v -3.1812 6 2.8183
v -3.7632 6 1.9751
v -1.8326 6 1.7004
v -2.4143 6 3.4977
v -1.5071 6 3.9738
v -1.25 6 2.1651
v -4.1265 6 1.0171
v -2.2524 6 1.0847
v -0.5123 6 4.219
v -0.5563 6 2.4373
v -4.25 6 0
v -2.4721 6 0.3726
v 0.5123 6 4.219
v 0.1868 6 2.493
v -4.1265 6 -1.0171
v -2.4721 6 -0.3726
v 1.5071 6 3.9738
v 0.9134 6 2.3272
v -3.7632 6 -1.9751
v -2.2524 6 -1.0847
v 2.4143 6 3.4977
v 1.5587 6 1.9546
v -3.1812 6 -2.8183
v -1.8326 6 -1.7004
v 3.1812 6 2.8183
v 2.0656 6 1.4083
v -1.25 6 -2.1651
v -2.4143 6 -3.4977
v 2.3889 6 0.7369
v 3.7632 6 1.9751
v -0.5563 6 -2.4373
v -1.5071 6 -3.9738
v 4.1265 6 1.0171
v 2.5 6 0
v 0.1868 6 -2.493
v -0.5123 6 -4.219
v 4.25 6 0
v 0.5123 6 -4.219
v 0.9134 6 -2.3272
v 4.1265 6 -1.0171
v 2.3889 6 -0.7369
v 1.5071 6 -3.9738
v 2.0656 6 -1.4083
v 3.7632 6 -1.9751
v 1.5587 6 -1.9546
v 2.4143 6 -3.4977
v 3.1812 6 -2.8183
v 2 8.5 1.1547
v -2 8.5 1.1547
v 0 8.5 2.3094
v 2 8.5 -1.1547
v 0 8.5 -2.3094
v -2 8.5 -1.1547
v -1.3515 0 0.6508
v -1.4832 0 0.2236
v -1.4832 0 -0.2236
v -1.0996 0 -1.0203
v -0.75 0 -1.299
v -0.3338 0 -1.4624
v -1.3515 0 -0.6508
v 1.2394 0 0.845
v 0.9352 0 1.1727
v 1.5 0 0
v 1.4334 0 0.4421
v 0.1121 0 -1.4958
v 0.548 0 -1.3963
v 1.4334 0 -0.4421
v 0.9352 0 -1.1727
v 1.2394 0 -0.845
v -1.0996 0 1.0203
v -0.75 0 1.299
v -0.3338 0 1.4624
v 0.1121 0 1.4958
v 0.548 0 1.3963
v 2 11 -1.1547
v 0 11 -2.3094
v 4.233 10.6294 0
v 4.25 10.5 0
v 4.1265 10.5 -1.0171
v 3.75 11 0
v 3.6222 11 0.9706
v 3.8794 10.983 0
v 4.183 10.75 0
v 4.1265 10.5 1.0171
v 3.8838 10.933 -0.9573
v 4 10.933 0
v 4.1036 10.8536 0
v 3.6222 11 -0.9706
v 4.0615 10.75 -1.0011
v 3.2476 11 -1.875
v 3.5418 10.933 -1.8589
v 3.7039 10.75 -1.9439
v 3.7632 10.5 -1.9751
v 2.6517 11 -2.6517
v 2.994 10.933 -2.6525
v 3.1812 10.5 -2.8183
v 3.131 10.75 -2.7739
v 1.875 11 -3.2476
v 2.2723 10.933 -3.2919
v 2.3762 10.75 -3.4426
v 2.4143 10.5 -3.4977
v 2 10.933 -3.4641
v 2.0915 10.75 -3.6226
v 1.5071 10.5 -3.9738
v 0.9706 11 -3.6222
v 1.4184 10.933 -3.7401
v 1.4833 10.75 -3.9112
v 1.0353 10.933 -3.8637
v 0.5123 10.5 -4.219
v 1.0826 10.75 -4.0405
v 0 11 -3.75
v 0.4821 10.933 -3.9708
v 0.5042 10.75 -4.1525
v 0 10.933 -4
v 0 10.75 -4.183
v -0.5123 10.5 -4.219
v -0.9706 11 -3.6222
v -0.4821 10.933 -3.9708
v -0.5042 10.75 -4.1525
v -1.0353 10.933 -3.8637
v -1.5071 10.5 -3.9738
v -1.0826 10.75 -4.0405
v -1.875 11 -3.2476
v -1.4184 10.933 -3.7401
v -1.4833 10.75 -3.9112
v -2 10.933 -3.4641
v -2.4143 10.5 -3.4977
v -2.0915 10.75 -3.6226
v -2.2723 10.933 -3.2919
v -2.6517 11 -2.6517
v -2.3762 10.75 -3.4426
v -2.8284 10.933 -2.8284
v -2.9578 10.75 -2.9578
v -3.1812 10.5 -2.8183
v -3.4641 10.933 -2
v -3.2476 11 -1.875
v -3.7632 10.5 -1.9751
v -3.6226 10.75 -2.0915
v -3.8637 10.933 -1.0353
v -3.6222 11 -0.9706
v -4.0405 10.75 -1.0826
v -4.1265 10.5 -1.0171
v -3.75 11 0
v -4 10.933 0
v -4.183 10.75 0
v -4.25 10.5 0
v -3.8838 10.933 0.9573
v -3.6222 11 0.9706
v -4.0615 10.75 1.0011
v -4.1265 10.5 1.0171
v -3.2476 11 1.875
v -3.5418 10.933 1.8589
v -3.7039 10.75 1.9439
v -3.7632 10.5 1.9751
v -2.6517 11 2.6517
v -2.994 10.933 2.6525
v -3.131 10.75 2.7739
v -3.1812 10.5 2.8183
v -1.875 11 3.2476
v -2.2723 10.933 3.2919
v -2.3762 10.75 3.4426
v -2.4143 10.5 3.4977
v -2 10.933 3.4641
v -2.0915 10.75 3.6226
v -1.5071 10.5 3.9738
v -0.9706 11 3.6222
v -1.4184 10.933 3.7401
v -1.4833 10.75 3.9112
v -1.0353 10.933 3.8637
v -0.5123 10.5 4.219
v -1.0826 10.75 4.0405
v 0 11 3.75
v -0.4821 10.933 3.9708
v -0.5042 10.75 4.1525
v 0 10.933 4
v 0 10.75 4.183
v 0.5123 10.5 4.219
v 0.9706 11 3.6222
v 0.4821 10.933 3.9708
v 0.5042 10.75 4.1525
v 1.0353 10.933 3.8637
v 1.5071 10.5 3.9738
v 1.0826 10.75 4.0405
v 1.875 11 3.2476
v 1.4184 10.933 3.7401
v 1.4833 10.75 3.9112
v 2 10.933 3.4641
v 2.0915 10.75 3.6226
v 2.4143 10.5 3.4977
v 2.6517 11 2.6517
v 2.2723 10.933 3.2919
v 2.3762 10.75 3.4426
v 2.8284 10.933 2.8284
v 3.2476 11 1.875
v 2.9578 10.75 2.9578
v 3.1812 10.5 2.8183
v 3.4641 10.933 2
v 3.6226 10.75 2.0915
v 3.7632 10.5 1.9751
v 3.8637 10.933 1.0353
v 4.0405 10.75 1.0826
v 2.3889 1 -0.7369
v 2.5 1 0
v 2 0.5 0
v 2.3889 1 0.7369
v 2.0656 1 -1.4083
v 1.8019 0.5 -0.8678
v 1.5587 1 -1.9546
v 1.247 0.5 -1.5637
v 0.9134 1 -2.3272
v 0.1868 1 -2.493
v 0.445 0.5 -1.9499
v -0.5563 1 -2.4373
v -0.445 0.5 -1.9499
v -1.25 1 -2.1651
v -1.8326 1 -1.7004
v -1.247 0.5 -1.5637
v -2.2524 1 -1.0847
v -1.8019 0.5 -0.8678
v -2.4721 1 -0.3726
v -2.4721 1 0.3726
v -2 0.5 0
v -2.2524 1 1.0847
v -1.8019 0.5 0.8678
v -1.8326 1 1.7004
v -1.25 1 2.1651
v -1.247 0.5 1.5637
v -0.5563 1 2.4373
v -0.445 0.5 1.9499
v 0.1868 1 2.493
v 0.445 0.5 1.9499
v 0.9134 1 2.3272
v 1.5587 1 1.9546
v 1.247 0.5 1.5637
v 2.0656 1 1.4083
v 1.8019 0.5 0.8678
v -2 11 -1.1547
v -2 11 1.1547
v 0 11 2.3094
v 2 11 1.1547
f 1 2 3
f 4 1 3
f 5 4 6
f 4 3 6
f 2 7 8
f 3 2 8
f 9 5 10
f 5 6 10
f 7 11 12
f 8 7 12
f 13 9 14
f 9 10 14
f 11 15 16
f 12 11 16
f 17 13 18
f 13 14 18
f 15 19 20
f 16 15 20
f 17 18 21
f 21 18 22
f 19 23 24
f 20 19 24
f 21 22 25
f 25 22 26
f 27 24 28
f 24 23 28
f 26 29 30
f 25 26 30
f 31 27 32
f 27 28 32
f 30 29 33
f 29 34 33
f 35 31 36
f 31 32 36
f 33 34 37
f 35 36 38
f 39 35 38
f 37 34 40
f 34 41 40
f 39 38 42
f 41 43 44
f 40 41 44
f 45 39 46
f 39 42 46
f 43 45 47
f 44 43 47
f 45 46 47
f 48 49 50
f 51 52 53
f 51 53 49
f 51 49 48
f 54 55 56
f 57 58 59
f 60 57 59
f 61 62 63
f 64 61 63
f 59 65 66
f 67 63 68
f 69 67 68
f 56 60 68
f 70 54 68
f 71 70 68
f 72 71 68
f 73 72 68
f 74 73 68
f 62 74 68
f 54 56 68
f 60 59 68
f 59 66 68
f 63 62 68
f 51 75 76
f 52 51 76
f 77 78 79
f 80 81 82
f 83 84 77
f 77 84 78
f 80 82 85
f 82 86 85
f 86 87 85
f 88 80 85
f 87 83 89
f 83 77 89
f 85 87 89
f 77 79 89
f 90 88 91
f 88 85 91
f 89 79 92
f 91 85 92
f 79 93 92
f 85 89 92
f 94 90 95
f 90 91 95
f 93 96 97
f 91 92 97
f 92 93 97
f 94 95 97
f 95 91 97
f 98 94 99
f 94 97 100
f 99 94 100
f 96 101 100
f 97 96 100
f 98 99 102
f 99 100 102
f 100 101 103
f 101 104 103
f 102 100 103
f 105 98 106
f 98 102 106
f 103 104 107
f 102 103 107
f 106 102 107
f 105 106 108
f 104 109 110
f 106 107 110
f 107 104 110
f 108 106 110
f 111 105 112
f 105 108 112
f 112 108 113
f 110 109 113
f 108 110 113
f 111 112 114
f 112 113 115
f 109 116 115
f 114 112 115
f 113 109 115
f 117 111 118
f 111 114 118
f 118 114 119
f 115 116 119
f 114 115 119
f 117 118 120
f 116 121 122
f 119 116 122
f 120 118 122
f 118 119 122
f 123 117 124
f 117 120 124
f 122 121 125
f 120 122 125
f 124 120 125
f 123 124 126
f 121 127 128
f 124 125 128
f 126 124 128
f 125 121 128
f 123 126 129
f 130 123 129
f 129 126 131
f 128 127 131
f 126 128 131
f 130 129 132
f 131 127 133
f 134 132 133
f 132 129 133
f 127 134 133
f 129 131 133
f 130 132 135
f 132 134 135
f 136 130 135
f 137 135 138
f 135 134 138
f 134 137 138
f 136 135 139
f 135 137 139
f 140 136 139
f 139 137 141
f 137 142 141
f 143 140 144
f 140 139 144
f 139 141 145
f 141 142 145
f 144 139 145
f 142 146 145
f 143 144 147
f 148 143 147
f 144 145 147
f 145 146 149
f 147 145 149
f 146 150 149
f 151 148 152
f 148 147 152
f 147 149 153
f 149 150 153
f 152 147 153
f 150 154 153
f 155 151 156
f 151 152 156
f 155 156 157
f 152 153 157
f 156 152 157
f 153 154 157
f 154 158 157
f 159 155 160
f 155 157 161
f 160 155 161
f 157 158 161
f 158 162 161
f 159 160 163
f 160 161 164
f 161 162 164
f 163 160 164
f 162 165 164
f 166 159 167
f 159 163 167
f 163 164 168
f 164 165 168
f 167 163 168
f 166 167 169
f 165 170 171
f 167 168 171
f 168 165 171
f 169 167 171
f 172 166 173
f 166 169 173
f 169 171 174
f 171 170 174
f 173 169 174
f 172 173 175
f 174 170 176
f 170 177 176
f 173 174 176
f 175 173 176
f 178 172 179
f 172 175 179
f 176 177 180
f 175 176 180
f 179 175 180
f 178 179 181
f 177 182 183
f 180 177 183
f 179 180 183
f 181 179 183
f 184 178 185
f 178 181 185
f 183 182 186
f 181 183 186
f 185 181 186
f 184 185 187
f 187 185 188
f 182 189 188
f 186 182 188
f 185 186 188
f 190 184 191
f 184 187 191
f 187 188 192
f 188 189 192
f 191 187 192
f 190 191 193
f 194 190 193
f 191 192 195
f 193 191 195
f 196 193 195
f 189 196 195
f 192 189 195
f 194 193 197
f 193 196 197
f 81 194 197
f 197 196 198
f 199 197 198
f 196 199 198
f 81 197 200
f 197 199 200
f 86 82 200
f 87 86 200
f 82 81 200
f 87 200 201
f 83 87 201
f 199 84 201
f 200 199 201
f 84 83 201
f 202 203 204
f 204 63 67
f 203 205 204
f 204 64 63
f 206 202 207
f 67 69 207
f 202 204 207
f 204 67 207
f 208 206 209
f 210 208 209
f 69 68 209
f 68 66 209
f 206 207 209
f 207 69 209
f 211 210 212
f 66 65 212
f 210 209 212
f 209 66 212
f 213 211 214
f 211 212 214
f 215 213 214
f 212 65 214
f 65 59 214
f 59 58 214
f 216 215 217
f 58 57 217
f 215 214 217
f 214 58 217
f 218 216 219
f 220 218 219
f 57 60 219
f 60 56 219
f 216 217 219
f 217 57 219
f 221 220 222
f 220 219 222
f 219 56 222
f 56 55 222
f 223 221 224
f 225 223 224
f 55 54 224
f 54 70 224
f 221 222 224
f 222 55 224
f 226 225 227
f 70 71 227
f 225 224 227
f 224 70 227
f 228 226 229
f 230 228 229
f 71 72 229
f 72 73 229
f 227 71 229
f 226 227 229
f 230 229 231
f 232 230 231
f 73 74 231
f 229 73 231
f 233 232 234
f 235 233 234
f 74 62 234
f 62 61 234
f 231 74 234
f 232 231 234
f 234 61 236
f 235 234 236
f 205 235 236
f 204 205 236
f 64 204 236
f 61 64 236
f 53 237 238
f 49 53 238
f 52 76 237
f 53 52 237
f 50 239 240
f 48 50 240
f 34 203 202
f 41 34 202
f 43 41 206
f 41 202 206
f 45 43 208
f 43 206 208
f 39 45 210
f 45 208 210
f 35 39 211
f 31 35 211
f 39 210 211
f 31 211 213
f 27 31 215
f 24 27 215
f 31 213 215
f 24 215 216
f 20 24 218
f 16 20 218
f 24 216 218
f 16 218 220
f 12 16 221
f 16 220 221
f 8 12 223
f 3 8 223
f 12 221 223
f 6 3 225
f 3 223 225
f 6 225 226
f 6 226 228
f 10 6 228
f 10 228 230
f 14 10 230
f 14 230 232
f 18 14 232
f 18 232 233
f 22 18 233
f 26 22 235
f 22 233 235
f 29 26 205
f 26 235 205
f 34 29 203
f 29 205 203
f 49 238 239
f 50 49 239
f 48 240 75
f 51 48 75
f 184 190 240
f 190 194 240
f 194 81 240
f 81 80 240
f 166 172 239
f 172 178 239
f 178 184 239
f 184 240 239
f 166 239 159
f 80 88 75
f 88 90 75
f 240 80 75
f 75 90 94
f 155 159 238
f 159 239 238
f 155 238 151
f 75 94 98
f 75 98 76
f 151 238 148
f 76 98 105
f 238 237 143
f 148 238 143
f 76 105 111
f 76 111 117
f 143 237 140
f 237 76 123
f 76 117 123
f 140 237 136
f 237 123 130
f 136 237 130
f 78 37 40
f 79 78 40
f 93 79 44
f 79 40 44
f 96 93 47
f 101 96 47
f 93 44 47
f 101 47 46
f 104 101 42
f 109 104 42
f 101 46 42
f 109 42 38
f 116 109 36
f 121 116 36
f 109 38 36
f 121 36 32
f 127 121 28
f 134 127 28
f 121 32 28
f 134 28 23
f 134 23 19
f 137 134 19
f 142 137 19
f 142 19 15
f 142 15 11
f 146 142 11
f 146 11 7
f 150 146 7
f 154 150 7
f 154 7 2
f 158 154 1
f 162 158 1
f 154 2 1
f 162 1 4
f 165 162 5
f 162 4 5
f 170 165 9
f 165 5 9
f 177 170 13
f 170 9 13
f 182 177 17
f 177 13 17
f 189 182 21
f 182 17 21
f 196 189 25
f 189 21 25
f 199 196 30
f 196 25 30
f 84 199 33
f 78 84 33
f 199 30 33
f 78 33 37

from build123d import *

# Parameters (mm, degrees)
CUT_EXTRUDE1_DEPTH = 2.5
FILLET1_R          = 0.5
CHAMFER1_SIZE      = 1


with BuildPart() as part:
    # Sketch1 → Revolve1 (revolve)
    with BuildSketch(Plane.XY, mode=Mode.PRIVATE) as revolve1_sk:
        Polygon((0, 0), (0, 11), (-4.25, 11), (-4.25, 6), (-2.5, 6), (-2.5, 0), align=None)
    revolve(revolve1_sk.sketch.rotate(Axis((0, -1000, 0), (0, 1, 0)), 180), axis=Axis((0, -1000, 0), (0, 1, 0)))

    # Sketch2 → Cut-Extrude1 (cut)
    with BuildSketch(Plane(origin=(0, 11, 0), x_dir=(1, 0, 0), z_dir=(0, 1, 0))):
        Polygon((0, 2.309401077), (-2, 1.154700538), (-2, -1.154700538), (0, -2.309401077), (2, -1.154700538), (2, 1.154700538), align=None)
    extrude(amount=-CUT_EXTRUDE1_DEPTH, mode=Mode.SUBTRACT)

    # Fillet1
    fillet1_edges = [part.edges().sort_by_distance(p)[0] for p in [
        (-4.25, 11, 0),
    ]]
    fillet(fillet1_edges, radius=FILLET1_R)

    # Chamfer1
    chamfer1_edges = [part.edges().sort_by_distance(p)[0] for p in [
        (-2.5, 0, 0),
    ]]
    chamfer(chamfer1_edges, length=CHAMFER1_SIZE)


solid = part.part
